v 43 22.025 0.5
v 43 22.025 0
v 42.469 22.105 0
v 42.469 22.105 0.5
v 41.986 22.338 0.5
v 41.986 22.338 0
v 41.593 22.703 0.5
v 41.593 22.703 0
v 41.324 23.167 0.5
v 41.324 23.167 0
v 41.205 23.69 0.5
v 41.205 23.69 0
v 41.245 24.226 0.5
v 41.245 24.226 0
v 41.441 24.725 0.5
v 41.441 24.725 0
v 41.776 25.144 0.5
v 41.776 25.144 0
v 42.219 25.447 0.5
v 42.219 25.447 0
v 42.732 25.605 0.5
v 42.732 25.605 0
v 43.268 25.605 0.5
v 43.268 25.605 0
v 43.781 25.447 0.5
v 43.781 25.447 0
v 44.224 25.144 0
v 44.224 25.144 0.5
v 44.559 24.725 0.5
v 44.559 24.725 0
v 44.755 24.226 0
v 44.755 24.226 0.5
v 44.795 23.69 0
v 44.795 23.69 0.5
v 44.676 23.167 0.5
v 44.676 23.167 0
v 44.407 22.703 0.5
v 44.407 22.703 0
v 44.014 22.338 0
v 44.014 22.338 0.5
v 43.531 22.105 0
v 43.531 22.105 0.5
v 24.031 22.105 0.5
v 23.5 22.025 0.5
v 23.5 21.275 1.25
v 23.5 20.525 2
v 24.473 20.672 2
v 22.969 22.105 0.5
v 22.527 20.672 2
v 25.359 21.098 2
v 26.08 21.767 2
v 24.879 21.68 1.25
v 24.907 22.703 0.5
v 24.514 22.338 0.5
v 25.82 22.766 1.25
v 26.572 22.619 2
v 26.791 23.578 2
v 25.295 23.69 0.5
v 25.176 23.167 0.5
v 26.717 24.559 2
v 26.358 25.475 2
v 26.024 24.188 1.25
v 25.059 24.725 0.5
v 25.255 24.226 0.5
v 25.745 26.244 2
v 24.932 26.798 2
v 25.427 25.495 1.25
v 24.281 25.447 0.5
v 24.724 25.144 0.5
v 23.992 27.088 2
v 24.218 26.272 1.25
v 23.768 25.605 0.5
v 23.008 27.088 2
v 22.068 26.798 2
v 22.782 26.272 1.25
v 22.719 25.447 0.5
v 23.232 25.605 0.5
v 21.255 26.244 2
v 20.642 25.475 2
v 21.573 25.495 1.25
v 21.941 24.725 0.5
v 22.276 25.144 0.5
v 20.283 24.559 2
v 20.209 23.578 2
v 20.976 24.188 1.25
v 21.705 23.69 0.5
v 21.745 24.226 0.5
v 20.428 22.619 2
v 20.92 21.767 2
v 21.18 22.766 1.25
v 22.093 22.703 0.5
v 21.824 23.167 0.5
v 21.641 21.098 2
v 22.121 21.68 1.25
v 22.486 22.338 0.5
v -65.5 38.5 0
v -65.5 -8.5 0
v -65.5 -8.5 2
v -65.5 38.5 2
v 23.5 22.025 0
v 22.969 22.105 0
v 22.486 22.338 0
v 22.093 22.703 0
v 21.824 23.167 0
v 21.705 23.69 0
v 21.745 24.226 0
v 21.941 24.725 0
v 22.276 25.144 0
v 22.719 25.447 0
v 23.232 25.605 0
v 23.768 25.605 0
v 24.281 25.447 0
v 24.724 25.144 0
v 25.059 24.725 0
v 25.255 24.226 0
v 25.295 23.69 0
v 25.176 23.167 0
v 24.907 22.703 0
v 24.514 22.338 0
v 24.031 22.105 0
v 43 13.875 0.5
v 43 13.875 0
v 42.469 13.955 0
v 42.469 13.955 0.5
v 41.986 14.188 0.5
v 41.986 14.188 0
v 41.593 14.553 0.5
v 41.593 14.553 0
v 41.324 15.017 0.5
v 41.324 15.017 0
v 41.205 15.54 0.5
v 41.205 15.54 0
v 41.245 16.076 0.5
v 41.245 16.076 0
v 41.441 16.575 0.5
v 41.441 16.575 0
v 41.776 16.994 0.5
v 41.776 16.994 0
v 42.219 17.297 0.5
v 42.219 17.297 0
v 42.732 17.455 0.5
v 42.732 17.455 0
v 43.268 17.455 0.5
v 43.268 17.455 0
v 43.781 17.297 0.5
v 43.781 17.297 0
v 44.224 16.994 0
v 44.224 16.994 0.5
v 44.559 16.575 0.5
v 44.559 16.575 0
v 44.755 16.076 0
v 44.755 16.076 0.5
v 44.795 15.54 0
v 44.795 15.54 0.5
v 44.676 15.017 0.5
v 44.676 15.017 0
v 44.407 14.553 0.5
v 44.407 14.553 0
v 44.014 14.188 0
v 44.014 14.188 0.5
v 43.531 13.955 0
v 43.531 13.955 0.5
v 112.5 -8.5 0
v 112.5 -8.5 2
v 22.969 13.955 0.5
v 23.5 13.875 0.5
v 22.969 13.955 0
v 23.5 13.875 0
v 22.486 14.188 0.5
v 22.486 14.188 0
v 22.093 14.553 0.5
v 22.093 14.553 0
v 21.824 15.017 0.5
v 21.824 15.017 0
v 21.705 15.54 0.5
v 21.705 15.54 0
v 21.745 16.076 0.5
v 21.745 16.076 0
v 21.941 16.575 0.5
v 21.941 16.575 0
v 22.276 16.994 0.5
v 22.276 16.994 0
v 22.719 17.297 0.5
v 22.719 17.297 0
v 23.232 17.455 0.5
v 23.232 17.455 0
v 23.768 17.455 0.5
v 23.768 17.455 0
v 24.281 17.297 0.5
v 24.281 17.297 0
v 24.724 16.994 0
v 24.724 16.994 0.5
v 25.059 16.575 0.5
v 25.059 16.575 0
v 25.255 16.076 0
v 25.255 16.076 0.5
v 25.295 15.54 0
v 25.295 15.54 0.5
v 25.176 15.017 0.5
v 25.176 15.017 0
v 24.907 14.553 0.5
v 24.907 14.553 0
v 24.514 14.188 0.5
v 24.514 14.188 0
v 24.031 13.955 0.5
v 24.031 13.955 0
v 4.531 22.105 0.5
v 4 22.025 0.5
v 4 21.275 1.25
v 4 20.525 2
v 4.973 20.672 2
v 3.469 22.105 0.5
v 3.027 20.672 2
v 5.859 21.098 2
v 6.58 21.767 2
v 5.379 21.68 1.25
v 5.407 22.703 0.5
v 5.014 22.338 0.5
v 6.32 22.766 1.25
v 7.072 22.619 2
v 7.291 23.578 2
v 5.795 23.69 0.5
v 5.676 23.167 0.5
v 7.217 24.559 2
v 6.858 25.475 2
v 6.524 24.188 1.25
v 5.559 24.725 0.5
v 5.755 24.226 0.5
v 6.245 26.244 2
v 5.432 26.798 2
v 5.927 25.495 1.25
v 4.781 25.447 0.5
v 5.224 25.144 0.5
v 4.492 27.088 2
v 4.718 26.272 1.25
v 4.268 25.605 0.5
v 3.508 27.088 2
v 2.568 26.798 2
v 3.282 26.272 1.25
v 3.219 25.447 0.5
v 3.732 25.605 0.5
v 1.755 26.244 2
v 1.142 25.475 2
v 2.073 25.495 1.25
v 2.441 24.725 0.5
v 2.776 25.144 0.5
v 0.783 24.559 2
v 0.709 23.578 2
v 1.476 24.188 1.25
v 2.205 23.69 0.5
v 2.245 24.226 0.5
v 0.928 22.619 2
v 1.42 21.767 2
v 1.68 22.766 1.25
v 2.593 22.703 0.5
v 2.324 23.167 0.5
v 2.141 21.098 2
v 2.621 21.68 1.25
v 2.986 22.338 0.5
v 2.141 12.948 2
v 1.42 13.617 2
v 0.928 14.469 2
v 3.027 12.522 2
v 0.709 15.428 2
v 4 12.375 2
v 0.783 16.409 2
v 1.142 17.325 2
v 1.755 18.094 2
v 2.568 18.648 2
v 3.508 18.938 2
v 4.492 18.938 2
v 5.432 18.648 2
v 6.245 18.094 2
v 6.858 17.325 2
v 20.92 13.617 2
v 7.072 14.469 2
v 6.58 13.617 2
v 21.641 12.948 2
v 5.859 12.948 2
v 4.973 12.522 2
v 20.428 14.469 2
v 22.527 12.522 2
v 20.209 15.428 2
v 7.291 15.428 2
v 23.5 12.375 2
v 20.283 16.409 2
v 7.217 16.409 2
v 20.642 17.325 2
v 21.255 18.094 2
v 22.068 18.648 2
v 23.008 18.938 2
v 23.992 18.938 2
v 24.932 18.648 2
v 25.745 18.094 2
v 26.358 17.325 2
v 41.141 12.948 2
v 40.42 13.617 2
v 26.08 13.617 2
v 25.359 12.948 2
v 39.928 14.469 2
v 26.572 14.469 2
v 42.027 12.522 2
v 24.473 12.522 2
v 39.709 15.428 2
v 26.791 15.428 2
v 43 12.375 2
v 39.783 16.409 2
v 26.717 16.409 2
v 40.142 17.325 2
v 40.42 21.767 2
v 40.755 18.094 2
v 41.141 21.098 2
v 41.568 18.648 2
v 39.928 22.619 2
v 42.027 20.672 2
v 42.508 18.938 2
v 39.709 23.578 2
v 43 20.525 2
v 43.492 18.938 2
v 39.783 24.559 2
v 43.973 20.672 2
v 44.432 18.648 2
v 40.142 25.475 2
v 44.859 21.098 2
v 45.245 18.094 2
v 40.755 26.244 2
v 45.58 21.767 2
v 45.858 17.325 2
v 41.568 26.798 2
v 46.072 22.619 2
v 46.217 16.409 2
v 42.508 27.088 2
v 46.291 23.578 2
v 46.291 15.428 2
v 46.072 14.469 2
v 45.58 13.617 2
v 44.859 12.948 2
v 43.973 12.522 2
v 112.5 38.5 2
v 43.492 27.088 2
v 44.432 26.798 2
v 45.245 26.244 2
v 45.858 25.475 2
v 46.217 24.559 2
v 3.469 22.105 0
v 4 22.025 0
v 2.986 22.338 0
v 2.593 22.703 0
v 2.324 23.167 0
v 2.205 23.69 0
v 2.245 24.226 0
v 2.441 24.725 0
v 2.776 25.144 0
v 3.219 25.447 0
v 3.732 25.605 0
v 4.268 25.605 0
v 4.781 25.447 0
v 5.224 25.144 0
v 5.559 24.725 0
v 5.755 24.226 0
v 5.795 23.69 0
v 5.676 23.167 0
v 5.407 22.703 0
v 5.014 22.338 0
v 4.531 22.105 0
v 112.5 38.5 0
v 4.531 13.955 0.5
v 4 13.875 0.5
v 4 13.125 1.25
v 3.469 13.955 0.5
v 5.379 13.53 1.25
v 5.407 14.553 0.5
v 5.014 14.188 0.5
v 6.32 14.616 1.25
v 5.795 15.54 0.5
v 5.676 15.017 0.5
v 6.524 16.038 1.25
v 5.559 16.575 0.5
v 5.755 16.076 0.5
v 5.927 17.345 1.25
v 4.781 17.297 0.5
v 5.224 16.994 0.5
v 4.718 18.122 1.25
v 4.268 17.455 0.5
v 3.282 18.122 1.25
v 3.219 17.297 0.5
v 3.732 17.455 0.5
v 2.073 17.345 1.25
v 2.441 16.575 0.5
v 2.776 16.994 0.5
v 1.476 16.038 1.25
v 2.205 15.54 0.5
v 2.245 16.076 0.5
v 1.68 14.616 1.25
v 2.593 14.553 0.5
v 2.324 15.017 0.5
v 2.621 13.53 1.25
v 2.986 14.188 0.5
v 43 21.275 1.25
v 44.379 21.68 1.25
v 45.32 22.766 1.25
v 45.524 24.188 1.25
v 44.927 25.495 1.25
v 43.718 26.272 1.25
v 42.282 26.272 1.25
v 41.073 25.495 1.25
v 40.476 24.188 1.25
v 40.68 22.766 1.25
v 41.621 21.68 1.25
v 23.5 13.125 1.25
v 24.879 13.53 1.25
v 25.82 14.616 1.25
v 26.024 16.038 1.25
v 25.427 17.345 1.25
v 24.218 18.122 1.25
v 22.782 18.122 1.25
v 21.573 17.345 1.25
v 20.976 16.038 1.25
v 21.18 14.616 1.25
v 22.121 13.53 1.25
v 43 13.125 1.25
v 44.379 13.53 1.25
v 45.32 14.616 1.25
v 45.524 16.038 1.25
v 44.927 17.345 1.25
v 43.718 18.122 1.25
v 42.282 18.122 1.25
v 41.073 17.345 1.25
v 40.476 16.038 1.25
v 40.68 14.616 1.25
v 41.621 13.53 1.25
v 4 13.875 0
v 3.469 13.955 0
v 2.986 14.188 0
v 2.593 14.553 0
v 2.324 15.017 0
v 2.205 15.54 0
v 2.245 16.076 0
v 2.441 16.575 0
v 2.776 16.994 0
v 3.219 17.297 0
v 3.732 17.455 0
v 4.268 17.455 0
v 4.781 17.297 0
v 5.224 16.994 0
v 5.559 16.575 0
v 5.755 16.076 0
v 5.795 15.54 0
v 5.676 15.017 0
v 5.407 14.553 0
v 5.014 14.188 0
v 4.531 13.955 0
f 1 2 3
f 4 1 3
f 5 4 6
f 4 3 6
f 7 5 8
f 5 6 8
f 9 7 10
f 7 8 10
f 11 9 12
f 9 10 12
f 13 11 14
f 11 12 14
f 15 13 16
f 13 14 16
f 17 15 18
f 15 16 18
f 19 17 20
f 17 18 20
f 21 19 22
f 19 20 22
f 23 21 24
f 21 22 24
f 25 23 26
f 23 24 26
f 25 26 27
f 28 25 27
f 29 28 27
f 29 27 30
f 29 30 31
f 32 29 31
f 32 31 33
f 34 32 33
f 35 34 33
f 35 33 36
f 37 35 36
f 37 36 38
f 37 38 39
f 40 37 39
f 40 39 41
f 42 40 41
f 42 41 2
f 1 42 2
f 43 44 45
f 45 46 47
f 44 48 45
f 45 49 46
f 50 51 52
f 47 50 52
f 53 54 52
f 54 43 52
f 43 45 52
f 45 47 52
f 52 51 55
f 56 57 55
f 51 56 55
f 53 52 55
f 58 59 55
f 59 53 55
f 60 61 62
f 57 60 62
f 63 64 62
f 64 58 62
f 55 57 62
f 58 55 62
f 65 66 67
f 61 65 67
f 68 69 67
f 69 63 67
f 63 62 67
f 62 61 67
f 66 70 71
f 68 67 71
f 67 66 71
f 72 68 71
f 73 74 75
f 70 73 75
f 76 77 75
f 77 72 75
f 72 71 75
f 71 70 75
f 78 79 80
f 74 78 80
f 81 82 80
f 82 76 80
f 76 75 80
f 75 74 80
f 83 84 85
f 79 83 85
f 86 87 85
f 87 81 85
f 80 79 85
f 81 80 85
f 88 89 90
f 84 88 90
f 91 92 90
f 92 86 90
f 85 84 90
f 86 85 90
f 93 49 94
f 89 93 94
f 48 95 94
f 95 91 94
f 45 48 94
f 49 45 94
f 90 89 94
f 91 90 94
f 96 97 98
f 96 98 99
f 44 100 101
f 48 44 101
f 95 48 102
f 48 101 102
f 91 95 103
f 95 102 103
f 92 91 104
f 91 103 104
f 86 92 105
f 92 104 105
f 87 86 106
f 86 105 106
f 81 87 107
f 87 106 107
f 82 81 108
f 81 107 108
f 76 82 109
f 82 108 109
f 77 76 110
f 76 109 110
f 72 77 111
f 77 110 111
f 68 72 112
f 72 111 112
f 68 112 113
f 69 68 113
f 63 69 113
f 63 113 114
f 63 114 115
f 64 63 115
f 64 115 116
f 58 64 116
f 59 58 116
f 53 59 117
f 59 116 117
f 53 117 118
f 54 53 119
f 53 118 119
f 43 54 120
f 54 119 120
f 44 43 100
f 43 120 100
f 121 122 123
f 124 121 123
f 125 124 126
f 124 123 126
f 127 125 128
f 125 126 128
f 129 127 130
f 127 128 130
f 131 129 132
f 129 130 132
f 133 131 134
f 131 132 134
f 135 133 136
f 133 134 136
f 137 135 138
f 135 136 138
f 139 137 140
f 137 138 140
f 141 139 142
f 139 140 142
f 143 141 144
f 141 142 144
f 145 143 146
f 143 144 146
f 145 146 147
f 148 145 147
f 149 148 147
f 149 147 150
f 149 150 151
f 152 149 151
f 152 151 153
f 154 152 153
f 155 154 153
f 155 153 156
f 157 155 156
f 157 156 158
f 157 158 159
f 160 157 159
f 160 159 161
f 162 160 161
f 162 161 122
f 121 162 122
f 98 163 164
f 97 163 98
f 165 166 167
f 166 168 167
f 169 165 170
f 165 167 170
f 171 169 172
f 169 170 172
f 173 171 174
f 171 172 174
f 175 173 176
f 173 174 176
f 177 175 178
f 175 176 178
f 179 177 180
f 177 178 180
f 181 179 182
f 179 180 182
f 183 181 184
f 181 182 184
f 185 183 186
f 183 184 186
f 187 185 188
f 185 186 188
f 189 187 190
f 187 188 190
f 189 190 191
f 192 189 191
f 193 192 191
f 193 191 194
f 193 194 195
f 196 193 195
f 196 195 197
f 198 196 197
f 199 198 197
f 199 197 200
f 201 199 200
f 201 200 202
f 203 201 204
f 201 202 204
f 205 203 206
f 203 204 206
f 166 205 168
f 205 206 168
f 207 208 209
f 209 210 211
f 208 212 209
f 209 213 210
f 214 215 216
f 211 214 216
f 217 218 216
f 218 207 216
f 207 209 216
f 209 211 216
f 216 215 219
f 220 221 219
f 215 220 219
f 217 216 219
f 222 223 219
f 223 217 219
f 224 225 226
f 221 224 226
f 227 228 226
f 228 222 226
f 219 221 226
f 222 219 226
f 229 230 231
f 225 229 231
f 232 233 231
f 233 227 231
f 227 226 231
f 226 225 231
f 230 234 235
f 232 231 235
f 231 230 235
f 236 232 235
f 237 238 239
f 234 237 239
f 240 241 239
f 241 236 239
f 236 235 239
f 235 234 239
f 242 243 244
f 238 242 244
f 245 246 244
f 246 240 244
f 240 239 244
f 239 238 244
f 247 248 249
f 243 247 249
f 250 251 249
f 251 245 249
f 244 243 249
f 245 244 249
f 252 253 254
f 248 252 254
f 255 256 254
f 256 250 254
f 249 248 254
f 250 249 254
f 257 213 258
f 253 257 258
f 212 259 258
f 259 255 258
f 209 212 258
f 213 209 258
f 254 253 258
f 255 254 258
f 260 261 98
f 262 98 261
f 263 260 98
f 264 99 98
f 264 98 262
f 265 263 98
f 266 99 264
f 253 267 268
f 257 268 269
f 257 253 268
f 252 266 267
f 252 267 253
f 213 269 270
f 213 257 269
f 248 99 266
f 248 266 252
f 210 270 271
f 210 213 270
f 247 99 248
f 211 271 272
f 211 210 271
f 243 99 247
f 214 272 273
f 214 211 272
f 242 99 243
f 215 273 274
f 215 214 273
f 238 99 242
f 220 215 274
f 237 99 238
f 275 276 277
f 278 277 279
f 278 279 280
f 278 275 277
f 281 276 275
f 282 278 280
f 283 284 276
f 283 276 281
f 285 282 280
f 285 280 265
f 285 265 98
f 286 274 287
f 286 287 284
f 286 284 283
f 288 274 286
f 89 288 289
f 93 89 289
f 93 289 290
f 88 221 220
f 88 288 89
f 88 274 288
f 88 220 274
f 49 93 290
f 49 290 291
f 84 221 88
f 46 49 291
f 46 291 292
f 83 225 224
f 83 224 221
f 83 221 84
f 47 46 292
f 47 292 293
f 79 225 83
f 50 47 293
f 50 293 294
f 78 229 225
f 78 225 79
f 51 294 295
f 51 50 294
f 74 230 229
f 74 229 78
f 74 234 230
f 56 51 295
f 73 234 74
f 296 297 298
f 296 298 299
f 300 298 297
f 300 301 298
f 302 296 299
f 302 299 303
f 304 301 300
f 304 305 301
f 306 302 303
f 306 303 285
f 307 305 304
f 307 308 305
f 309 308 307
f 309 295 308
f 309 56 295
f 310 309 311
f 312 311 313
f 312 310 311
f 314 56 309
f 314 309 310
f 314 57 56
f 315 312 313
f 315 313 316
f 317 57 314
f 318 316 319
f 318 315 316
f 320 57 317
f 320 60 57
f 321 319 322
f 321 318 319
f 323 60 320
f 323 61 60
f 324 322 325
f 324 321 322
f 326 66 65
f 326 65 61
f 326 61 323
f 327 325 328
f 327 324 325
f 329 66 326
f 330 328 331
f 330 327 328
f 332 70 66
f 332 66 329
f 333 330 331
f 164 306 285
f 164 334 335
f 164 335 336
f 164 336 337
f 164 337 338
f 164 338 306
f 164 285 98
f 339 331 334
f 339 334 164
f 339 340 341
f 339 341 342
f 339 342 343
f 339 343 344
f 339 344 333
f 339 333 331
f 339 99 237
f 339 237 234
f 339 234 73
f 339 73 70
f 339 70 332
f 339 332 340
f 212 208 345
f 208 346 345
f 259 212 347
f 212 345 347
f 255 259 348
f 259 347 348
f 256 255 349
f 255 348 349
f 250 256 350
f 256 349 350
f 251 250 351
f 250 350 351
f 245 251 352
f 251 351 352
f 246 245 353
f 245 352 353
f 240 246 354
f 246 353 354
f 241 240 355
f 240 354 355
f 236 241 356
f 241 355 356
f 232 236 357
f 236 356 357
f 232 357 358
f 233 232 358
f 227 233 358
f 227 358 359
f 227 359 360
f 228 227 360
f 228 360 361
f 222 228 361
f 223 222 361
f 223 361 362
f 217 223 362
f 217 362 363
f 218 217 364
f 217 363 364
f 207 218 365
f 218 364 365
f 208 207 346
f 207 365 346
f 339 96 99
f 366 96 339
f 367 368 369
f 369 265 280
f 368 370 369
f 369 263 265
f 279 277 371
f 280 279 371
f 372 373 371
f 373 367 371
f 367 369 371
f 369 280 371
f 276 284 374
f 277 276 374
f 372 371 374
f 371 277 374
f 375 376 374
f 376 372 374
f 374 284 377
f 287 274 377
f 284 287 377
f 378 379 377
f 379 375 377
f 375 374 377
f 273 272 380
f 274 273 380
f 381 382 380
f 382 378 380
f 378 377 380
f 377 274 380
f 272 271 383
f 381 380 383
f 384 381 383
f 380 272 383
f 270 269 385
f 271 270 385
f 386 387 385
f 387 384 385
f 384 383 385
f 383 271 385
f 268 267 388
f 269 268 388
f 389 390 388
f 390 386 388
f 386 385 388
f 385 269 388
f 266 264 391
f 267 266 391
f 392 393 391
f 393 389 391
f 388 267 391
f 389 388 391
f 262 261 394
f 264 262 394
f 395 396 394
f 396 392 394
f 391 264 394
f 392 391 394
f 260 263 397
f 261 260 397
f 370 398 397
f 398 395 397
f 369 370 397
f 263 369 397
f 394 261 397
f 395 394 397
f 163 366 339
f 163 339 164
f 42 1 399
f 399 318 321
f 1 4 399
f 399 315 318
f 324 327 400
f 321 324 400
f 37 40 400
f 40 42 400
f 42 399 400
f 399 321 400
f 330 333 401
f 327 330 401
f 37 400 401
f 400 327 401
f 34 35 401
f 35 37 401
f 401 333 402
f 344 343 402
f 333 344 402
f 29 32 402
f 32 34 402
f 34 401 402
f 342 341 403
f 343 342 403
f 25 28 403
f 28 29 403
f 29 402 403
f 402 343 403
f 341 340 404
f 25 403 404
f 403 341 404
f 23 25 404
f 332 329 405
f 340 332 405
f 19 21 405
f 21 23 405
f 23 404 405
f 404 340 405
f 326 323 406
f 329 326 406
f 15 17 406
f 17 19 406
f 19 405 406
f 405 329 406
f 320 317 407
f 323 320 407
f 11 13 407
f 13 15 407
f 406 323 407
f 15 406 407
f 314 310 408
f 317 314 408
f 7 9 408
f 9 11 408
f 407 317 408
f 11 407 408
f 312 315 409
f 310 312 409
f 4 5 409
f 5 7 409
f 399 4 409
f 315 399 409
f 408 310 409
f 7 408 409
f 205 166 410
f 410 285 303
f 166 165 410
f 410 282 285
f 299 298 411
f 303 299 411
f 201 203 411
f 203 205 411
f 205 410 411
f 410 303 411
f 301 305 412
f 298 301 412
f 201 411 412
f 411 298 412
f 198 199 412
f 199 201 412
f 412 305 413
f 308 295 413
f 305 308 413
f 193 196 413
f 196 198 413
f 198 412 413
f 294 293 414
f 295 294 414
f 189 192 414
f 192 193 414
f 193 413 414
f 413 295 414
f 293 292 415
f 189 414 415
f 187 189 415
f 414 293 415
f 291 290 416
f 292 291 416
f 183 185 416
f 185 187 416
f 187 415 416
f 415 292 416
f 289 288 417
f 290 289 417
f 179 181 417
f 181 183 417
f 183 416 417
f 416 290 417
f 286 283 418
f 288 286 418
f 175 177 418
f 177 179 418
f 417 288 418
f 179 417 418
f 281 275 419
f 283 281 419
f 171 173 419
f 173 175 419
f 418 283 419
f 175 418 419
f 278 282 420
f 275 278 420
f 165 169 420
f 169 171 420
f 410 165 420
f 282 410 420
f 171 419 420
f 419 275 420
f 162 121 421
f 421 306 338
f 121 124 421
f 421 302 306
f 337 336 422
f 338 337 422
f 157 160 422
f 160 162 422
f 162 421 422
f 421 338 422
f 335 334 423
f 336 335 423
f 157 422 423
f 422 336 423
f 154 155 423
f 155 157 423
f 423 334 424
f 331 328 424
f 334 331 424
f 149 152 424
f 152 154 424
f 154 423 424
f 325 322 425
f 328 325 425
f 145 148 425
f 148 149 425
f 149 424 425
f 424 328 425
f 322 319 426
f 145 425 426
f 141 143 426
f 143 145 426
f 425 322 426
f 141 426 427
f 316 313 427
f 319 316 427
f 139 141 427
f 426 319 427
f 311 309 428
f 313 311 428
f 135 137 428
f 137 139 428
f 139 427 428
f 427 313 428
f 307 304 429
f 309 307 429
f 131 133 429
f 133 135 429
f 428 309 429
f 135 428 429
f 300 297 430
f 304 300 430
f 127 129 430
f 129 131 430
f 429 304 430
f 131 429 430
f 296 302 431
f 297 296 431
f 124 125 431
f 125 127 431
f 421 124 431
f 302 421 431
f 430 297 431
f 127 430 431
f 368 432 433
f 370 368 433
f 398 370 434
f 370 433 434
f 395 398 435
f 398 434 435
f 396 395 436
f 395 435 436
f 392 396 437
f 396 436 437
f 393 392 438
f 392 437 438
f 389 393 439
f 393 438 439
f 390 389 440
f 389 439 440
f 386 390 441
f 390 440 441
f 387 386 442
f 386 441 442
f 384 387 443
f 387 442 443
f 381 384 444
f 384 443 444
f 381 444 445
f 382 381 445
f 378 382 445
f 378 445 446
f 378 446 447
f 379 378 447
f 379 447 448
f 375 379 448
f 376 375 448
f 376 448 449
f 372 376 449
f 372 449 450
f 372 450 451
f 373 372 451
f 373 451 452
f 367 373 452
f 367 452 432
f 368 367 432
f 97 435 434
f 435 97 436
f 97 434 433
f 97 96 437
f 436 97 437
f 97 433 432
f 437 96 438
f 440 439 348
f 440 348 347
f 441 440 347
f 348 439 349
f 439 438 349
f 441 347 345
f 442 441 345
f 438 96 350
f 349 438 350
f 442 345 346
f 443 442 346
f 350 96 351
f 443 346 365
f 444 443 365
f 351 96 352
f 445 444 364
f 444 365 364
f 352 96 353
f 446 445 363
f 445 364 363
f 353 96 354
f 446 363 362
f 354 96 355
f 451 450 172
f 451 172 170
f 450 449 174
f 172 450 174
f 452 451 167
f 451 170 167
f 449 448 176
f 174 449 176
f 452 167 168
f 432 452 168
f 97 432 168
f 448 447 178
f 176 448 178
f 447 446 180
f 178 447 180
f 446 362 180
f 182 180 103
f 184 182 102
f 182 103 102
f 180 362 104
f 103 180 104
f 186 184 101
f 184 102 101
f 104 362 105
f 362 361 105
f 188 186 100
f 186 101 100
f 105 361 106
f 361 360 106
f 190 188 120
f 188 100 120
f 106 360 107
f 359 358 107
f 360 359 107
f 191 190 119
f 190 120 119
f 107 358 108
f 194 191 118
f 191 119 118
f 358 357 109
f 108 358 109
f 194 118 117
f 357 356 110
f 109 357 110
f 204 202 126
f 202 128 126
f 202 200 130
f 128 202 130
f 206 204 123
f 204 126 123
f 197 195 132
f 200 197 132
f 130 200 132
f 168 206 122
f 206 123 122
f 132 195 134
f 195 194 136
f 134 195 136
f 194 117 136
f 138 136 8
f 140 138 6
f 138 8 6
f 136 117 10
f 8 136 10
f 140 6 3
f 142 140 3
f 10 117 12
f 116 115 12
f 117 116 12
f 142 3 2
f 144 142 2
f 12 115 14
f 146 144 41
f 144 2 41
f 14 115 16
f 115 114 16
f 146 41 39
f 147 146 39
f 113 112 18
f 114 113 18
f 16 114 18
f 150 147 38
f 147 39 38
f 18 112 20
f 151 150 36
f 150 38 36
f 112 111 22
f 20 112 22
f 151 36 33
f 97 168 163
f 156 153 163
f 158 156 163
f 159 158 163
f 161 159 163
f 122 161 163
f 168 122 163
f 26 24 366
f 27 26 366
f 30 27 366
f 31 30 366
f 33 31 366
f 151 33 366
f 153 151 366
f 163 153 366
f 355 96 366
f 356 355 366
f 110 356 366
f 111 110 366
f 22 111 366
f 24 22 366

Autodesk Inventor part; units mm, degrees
ref_plane "YZ Plane" through (0, 0, 0) normal (1, 0, 0) x (0, 1, 0)
ref_plane "XZ Plane" through (0, 0, 0) normal (0, 1, 0) x (-1, 0, 0)
ref_plane "XY Plane" through (0, 0, 0) normal (0, 0, 1) x (1, 0, 0)
ref_plane "Work Plane1" through (0, 0, 0) normal (0, 0, 1) x (1, 0, 0)
sketch "Sketch1" plane through (0, 0, 0) normal (0, 0, 1) x (1, 0, 0)
  line L0 (0, 0) -> (47, 0) projected
  line L1 (47, 0) -> (47, 3) projected
  line L2 (0, 3) -> (47, 3) projected
  line L3 (0, 0) -> (0, 3) projected
  line L4 (-65.5, 38.5) -> (112.5, 38.5)
  line L5 (112.5, 38.5) -> (112.5, -8.5)
  line L6 (112.5, -8.5) -> (-65.5, -8.5)
  line L7 (-65.5, -8.5) -> (-65.5, 38.5)
  line L8 (-65, -11.5) -> (-65, 38.5) projected
  point P0 (23.5, 0)
  dimension "d0" = 178
  dimension "d1" = 89
  dimension "d2" = 89
  dimension "d3" = 0
  dimension "d13" = 3
extrude "Extrusion1" add sketch "Sketch1" along normal blind 2 contours L3 L2 L1 L0 | L4 L8 L6 L7 | L4 L5 L6 L8
sketch "Sketch2" plane through (0, 0, 2) normal (0, 0, 1) x (1, 0, 0)
  circle A0 centre (4, 23.825) radius 2.3 projected
  circle A1 centre (4, 15.675) radius 2.3 projected
  line L0 (7, 36.5) -> (1, 36.5) projected
  line L1 (1, 3) -> (1, 36.5) projected
  line L2 (1, 3) -> (7, 3) projected
  line L3 (7, 3) -> (7, 36.5) projected
  circle A2 centre (23.5, 23.825) radius 2.3 projected
  circle A3 centre (23.5, 15.675) radius 2.3 projected
  line L4 (28, 36.5) -> (19, 36.5) projected
  line L5 (19, 3) -> (19, 36.5) projected
  line L6 (19, 3) -> (28, 3) projected
  line L7 (28, 3) -> (28, 36.5) projected
  circle A4 centre (43, 23.825) radius 2.3 projected
  circle A5 centre (43, 15.675) radius 2.3 projected
  line L8 (46, 36.5) -> (40, 36.5) projected
  line L9 (40, 3) -> (40, 36.5) projected
  line L10 (40, 3) -> (46, 3) projected
  line L11 (46, 3) -> (46, 36.5) projected
  point P0 (0, 0)
hole "Hole1" at (4, 23.825, 2) at (4, 15.675, 2) at (23.5, 15.675, 2) at (23.5, 23.825, 2) at (43, 23.825, 2) at (43, 15.675, 2) direction (0, 0, -1) diameter 3.6 end through all countersink diameter 6.6 countersink angle 90 clearance for "Countersunk Flat Head Screw ISO 2009/7046" size "M3" standard "ISO"
equation "\"d1\" = d2"
properties part number "back"
